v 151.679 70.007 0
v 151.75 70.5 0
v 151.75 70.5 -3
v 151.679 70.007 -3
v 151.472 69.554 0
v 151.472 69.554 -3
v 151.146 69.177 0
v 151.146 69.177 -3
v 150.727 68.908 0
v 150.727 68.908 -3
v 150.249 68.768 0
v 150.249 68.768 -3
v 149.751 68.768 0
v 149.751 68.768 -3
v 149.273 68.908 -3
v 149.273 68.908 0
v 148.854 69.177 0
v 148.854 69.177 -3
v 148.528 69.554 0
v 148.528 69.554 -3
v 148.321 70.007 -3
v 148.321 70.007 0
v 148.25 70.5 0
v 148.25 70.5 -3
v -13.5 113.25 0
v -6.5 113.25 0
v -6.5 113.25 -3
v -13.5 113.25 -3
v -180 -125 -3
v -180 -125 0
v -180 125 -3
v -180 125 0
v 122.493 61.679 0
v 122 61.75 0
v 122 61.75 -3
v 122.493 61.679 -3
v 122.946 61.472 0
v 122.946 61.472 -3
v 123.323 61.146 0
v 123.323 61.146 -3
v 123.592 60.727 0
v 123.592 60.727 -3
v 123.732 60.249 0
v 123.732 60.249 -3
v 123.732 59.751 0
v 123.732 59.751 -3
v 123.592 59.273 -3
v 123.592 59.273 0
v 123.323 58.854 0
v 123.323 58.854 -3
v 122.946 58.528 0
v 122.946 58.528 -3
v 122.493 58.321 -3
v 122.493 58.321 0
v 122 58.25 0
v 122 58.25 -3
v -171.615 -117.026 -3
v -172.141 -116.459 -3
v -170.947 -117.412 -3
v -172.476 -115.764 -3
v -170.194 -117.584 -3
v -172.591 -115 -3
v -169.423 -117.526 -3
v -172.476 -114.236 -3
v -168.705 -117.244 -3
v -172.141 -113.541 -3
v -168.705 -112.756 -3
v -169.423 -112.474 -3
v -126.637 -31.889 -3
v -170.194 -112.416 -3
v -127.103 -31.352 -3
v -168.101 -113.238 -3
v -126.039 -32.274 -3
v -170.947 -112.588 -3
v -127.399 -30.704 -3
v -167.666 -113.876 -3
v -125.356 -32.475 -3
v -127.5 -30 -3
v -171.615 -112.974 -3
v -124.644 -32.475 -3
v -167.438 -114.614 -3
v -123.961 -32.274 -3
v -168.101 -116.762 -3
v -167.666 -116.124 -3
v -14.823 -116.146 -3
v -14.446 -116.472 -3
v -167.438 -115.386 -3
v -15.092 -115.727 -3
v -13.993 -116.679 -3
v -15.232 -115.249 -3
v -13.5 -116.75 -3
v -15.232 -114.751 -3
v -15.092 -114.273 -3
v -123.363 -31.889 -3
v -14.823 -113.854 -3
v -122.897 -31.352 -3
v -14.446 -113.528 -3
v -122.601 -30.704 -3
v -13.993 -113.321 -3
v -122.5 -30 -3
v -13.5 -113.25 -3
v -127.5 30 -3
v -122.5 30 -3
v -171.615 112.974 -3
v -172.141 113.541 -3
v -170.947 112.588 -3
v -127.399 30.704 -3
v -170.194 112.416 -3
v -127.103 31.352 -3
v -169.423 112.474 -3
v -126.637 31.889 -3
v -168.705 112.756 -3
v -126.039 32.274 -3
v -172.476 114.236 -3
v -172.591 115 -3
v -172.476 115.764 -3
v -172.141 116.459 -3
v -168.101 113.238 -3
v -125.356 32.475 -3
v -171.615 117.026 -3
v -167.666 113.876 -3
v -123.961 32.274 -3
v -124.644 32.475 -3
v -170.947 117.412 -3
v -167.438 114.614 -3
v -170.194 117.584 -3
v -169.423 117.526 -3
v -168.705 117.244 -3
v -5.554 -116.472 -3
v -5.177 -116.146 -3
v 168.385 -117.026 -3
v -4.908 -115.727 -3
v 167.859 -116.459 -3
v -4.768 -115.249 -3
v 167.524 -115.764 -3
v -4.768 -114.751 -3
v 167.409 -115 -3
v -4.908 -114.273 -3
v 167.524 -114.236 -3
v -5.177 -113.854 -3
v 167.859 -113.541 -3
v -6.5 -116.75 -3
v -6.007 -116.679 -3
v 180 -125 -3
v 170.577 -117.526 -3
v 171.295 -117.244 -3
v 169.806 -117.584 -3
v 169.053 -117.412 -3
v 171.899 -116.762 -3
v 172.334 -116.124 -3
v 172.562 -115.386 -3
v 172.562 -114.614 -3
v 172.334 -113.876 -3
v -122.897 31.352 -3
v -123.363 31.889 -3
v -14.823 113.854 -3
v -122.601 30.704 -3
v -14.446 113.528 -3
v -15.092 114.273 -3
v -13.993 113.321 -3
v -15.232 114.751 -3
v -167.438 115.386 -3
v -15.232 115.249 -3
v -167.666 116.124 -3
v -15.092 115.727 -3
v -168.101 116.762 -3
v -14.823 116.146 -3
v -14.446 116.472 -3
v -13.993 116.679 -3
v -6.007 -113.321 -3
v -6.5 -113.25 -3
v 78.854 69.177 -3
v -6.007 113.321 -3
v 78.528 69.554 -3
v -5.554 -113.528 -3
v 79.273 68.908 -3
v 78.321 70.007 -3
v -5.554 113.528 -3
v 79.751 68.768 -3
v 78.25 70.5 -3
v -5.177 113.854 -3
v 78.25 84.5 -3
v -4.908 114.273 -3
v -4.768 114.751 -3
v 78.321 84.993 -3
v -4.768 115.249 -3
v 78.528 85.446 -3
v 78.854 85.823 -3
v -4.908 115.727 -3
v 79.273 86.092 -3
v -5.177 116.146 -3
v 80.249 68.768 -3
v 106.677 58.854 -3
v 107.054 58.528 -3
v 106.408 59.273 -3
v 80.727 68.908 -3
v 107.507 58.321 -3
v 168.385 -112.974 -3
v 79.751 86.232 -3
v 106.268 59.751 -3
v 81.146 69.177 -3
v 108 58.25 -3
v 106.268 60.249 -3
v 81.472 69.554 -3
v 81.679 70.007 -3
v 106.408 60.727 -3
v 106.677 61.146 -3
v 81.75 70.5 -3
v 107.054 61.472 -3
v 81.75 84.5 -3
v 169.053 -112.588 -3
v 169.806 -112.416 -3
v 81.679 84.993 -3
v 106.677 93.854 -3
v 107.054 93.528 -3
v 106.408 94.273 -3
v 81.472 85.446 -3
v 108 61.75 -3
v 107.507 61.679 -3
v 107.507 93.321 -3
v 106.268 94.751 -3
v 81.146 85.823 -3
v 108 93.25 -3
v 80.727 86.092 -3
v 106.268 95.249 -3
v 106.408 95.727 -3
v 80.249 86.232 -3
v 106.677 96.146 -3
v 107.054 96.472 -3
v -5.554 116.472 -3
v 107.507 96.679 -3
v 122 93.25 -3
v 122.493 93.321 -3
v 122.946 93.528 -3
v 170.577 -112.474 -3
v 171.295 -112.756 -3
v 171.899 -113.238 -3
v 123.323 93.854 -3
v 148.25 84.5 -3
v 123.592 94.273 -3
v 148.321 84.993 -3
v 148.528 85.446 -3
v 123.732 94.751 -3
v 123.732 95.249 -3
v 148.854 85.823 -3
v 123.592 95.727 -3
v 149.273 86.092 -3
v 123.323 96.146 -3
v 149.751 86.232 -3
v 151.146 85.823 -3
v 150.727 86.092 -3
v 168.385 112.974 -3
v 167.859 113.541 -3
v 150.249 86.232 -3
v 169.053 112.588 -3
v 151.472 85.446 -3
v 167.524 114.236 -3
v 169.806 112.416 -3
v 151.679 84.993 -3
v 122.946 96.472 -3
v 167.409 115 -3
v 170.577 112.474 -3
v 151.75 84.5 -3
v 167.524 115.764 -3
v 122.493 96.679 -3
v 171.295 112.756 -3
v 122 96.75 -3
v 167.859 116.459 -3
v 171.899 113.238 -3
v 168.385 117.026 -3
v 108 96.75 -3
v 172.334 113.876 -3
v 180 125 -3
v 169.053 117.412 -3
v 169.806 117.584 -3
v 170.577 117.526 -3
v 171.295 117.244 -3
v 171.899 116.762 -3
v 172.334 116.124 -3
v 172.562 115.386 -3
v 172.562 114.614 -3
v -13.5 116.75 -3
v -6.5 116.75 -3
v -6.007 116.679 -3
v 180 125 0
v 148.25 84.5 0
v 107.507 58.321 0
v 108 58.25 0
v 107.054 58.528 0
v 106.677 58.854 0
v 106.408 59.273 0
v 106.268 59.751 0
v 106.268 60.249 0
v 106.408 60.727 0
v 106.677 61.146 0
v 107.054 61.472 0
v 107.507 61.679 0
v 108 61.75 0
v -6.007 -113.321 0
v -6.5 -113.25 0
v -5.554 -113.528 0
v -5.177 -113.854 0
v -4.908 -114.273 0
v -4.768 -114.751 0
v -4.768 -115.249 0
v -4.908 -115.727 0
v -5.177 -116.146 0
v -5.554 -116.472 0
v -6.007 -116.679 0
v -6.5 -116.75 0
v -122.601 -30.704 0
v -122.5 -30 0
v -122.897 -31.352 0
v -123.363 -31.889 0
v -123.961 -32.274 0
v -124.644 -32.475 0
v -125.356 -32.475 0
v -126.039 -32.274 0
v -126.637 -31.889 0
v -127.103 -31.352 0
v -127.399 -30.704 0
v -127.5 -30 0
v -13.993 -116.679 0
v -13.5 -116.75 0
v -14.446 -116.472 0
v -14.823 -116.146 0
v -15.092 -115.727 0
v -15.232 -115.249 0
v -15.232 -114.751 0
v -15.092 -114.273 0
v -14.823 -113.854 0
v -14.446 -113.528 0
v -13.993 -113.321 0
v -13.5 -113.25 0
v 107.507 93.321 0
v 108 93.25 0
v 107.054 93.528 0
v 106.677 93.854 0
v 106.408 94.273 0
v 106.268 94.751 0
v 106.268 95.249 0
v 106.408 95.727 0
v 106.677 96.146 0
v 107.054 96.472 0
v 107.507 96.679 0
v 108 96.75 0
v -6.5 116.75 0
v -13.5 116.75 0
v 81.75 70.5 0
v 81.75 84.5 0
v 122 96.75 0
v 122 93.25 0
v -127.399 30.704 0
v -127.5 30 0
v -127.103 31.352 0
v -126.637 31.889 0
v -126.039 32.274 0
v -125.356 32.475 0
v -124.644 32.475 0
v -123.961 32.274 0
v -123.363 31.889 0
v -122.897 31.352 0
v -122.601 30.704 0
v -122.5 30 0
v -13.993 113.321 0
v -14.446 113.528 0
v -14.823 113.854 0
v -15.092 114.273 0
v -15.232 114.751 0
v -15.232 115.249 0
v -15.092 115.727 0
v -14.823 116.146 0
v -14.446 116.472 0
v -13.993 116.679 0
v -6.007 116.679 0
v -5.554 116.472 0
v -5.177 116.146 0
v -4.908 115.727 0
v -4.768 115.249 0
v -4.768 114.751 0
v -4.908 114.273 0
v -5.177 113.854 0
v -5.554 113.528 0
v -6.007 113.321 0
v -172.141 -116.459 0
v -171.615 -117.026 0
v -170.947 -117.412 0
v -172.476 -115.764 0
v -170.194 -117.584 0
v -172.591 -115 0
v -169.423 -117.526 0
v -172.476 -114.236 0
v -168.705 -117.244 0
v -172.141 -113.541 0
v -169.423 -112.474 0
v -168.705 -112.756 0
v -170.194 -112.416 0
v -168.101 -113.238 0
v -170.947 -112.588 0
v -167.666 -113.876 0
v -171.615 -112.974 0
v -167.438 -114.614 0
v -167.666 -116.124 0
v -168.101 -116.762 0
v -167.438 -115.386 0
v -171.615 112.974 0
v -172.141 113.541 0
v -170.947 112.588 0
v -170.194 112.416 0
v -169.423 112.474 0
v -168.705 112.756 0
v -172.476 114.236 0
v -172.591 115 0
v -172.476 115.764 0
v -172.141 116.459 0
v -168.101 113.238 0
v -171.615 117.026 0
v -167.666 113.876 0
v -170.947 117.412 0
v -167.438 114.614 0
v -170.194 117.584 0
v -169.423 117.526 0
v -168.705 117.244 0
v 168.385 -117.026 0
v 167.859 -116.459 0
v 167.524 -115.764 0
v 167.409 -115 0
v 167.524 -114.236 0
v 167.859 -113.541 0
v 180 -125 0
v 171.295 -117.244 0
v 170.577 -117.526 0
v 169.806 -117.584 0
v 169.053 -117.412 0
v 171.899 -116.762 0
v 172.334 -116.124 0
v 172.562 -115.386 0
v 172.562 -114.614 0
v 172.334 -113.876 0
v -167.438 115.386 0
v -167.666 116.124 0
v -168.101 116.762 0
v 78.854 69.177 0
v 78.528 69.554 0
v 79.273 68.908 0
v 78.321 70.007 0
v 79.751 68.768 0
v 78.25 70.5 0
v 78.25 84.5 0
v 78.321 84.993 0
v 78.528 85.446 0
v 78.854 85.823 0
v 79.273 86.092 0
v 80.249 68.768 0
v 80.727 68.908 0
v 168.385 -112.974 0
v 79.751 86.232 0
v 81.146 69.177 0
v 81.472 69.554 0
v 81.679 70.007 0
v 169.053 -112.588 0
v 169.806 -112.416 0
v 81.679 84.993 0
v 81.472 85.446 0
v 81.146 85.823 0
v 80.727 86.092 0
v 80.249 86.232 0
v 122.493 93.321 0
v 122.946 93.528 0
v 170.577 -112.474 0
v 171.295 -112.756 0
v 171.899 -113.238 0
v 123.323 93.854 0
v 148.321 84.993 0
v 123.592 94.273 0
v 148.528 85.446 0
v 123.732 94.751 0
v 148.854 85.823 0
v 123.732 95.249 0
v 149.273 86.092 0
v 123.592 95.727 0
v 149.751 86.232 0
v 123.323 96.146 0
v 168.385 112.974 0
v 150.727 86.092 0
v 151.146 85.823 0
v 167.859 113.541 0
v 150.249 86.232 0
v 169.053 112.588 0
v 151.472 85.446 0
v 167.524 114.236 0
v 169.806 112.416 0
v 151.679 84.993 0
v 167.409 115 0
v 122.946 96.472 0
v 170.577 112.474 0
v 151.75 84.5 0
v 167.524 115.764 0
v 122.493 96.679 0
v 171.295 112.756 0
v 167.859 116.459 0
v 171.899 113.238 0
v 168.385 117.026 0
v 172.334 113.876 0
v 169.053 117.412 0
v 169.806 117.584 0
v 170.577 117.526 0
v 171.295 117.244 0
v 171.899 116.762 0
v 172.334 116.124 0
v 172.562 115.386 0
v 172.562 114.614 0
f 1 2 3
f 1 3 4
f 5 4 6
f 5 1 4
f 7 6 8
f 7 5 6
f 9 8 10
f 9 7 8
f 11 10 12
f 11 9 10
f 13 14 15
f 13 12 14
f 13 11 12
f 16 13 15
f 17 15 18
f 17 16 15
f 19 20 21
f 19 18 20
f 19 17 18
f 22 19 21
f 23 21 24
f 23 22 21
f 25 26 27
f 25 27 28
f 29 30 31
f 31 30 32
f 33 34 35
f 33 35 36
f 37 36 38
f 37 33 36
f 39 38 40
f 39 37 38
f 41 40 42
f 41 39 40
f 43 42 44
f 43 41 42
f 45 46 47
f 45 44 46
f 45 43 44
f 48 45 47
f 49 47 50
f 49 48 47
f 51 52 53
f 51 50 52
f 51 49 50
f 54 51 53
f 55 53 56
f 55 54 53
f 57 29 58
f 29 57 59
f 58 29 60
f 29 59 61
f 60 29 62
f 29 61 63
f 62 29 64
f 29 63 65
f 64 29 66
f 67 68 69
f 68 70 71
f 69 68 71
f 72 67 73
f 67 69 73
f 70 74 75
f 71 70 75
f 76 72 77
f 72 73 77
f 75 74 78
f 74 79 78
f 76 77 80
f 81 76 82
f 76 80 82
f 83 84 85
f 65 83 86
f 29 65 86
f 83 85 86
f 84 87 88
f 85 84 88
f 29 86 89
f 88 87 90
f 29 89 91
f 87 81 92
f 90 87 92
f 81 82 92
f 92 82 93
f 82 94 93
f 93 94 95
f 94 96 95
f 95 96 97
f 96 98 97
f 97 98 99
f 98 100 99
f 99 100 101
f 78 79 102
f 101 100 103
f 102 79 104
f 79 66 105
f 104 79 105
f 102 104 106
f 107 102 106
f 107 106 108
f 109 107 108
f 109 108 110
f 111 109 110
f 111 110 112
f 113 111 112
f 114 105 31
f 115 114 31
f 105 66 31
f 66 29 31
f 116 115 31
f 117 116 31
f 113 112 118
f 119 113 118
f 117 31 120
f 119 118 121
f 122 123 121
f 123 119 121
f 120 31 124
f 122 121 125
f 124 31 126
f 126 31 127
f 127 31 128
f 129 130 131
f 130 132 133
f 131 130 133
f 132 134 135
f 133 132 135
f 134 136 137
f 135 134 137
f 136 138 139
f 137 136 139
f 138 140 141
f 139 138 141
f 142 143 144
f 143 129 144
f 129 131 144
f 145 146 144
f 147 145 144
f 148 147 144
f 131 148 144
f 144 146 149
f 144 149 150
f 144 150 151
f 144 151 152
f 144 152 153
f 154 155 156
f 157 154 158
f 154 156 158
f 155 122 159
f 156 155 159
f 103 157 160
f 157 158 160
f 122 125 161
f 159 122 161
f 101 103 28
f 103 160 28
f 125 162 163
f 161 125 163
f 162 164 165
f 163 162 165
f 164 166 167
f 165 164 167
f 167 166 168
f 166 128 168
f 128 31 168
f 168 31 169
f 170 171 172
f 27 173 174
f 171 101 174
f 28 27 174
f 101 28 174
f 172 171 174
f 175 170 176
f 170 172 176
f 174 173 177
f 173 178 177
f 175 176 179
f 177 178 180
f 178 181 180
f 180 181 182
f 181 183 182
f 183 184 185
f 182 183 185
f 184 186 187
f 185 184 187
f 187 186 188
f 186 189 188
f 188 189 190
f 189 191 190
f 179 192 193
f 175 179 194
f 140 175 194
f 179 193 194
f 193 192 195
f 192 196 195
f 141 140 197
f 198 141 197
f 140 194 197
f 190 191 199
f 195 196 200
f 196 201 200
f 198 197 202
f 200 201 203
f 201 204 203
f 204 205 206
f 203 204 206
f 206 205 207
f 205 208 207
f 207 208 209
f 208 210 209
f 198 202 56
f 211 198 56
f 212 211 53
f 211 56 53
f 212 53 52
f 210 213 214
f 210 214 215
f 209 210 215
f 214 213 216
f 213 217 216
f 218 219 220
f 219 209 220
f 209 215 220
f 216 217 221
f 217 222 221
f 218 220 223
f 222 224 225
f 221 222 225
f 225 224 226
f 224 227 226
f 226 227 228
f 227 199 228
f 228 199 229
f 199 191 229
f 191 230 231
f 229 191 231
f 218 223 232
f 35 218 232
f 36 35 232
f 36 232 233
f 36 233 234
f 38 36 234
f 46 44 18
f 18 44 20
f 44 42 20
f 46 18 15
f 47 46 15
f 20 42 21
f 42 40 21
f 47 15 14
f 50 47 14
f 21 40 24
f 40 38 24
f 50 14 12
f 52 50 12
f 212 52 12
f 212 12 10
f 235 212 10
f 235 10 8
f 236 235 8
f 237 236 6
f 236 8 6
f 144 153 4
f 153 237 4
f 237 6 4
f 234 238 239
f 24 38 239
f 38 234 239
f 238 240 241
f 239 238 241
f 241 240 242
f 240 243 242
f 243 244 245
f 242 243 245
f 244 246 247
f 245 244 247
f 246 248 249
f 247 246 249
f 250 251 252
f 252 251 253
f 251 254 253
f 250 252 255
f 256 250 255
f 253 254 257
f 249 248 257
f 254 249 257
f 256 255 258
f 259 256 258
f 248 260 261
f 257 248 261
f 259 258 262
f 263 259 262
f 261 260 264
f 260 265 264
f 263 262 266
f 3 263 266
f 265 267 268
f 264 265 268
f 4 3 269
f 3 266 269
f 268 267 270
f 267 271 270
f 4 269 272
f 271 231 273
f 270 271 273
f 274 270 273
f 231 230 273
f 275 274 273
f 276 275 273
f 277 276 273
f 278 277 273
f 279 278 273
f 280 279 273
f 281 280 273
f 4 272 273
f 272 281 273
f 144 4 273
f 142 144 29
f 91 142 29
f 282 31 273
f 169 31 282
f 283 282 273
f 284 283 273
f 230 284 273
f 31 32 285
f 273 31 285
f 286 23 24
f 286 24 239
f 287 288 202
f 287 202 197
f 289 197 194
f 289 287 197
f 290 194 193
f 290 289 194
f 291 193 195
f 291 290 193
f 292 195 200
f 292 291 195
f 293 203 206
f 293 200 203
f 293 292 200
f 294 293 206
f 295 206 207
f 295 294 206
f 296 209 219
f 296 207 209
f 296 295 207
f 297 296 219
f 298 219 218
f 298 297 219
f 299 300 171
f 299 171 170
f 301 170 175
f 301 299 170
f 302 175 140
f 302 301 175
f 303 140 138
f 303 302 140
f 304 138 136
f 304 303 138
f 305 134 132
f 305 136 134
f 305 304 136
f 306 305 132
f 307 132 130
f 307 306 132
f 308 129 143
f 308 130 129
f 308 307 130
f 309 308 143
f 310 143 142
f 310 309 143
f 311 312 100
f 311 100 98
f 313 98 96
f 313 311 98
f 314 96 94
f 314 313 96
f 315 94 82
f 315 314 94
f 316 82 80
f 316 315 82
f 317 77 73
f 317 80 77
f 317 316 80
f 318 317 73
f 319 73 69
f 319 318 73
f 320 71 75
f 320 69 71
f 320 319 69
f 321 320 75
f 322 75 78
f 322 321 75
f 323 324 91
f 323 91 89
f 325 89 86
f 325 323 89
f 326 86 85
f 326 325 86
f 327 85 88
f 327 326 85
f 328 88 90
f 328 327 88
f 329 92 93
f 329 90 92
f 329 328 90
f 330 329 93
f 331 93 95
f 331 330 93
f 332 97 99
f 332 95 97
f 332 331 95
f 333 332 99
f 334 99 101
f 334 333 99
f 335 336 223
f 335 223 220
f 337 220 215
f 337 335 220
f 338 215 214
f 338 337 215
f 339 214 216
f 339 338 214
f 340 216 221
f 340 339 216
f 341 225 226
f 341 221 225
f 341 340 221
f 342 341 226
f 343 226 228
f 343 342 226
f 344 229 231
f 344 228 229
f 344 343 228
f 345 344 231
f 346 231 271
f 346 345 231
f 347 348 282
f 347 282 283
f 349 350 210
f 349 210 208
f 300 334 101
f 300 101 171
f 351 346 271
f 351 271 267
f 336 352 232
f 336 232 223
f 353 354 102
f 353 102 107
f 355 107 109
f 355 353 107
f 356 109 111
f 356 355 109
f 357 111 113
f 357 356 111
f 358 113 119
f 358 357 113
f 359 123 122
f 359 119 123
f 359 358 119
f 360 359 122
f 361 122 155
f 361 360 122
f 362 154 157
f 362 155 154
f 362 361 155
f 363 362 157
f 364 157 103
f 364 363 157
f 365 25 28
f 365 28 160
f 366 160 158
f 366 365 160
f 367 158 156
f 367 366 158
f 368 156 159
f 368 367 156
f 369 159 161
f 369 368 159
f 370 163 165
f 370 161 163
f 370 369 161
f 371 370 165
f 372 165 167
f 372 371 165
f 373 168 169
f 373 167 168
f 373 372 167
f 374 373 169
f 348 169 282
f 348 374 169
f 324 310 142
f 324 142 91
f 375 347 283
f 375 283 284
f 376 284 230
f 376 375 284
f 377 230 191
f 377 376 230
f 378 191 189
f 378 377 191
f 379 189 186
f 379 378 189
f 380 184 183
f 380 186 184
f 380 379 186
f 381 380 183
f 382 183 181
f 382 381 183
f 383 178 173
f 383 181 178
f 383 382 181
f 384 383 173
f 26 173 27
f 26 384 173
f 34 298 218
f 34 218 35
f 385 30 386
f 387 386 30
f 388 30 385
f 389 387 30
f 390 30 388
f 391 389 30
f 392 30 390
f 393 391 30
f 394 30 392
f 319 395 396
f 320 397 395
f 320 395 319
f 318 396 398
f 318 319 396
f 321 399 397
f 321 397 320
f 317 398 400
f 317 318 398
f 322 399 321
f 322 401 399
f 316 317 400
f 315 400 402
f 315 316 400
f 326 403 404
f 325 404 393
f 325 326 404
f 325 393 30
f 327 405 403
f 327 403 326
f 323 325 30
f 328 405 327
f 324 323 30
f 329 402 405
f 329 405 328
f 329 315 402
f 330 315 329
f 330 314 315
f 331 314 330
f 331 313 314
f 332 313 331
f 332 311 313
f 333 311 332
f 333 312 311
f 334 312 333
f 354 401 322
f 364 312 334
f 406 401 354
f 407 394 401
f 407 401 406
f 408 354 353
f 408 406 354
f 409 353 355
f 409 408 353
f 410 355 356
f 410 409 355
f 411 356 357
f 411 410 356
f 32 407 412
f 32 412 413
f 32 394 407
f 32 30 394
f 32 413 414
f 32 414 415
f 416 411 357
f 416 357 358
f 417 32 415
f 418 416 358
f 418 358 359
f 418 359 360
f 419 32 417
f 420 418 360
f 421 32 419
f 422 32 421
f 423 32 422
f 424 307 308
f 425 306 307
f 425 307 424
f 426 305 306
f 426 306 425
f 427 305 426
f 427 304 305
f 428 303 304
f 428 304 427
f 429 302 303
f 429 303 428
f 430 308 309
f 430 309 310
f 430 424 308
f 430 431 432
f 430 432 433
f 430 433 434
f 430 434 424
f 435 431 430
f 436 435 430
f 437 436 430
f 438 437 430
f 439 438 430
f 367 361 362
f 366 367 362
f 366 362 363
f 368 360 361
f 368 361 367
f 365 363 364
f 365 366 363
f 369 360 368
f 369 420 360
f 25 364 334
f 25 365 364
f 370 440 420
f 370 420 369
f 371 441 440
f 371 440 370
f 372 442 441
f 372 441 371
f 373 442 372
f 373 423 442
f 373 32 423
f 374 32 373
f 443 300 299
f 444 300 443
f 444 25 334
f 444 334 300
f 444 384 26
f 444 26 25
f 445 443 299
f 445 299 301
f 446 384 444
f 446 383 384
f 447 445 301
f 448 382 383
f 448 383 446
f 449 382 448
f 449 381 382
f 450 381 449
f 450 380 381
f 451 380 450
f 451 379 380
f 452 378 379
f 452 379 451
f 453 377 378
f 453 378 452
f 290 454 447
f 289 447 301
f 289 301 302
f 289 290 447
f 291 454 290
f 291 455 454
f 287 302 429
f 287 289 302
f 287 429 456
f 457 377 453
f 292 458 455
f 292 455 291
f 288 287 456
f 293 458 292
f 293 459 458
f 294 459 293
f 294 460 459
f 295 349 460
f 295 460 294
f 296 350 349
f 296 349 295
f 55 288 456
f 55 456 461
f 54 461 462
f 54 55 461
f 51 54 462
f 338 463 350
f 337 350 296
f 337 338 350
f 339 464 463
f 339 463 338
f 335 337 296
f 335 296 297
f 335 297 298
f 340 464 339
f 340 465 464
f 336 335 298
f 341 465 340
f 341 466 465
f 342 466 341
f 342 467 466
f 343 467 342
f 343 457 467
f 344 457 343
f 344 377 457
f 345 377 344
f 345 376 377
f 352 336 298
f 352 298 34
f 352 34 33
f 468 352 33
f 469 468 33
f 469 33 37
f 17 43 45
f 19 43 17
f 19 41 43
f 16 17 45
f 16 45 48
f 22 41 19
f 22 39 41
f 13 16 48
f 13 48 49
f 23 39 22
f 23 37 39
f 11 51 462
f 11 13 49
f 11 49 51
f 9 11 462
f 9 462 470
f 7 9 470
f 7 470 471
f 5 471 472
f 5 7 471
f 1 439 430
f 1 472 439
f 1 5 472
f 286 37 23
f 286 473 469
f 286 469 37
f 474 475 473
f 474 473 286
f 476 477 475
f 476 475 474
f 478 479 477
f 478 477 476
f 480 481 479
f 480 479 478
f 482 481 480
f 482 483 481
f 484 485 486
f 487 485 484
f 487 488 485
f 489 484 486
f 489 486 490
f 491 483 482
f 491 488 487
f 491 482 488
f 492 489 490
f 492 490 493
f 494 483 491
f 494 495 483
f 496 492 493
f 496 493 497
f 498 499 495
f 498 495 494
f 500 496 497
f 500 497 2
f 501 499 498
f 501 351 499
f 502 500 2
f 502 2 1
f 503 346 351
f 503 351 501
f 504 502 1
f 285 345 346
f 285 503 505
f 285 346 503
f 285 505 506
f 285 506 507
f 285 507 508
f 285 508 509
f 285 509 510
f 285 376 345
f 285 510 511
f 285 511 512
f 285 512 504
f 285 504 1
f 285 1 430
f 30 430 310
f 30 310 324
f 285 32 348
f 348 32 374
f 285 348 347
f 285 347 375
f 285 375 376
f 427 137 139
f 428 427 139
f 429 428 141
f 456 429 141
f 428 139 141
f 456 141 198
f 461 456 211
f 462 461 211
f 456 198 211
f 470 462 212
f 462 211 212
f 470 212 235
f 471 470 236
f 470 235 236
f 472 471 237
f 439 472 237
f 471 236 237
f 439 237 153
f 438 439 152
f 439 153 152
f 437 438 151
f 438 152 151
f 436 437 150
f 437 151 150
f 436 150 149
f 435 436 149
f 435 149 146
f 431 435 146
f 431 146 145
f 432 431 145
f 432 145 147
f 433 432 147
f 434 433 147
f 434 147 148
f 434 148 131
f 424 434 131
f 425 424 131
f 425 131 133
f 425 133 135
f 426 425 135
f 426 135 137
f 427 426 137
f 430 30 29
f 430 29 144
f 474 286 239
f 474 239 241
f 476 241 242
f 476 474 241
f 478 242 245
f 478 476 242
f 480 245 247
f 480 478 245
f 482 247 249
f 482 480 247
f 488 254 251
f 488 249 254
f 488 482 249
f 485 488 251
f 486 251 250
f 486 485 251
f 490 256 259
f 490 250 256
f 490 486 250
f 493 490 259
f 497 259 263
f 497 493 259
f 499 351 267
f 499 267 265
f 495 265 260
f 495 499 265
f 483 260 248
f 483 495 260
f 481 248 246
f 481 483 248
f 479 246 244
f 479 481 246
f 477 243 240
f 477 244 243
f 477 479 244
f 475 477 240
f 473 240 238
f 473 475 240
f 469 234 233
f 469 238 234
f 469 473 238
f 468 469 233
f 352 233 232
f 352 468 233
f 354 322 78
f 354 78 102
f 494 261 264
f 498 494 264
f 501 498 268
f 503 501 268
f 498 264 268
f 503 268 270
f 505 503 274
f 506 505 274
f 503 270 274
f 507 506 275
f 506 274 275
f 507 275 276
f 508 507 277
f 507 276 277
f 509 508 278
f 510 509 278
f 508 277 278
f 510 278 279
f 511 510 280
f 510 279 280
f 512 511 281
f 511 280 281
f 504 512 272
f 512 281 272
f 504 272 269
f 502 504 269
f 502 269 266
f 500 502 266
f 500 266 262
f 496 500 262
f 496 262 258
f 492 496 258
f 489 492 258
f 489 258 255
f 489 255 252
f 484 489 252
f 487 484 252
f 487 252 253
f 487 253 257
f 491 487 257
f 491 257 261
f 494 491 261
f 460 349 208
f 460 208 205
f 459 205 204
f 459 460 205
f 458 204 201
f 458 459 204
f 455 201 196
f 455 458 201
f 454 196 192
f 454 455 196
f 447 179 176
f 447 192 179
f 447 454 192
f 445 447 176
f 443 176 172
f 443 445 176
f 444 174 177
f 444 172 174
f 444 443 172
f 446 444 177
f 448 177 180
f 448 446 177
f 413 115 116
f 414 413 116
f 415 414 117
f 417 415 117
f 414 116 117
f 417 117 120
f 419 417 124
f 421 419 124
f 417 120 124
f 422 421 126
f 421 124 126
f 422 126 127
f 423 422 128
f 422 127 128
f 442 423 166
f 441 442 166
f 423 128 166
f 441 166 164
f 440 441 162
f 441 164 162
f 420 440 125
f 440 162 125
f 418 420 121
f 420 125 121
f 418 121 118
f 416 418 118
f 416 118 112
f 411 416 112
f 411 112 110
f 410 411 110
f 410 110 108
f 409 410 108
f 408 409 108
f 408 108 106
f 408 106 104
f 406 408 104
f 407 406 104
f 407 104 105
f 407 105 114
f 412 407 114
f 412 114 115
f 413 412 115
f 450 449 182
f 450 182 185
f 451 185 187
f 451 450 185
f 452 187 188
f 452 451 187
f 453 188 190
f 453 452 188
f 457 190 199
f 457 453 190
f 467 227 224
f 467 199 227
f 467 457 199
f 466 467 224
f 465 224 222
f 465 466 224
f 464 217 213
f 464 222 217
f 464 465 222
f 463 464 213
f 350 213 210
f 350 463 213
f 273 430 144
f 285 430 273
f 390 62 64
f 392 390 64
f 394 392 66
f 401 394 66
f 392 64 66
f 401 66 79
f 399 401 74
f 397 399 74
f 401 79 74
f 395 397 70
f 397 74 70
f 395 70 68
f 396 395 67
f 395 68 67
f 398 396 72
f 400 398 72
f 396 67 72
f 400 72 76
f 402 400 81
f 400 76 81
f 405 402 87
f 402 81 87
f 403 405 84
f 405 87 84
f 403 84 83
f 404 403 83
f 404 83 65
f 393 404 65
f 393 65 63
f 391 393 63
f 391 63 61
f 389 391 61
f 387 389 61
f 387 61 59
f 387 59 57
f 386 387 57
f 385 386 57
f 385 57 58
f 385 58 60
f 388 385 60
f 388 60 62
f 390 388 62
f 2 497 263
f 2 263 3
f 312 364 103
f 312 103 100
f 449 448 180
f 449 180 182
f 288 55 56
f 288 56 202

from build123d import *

# Parameters (mm, degrees)
SKETCH1_W                  = 360
SKETCH1_H                  = 250
BASE_FLANGE1_DEPTH         = 3
F_6_0_204_DIAMETER_SLOT1_D = 5.1816
CUT_EXTRUDE1_DEPTH         = 10
CUT_EXTRUDE2_DEPTH         = 10
CUT_EXTRUDE4_DEPTH         = 10
CUT_EXTRUDE5_DEPTH         = 10
CUT_EXTRUDE6_DEPTH         = 10
CUT_EXTRUDE7_DEPTH         = 10
CUT_EXTRUDE8_DEPTH         = 10


# Sheet-metal steps are written as plain solids
with BuildPart() as part:
    # Sketch1 → Base-Flange1 (new body)
    with BuildSketch(Plane.XY):
        Rectangle(SKETCH1_W, SKETCH1_H)
    extrude(amount=-BASE_FLANGE1_DEPTH)

    # #6 (0.204) Diameter Slot1 (through all)
    with Locations(Plane.XY):
        with Locations((-170, -115), (-170, 115), (170, 115), (170, -115)):
            Hole(F_6_0_204_DIAMETER_SLOT1_D / 2)

    # Sketch8 → Cut-Extrude1 (cut)
    with BuildSketch(Plane.XY):
        with BuildLine():
            Line((-13.5, -113.25), (-6.5, -113.25))
            ThreePointArc((-6.5, -113.25), (-4.75, -115), (-6.5, -116.75))
            Line((-6.5, -116.75), (-13.5, -116.75))
            ThreePointArc((-13.5, -116.75), (-15.25, -115), (-13.5, -113.25))
        make_face()
    extrude(amount=-CUT_EXTRUDE1_DEPTH, mode=Mode.SUBTRACT)

    # Sketch9 → Cut-Extrude2 (cut)
    with BuildSketch(Plane.XY):
        with BuildLine():
            Line((-13.5, 116.75), (-6.5, 116.75))
            ThreePointArc((-6.5, 116.75), (-4.75, 115), (-6.5, 113.25))
            Line((-6.5, 113.25), (-13.5, 113.25))
            ThreePointArc((-13.5, 113.25), (-15.25, 115), (-13.5, 116.75))
        make_face()
    extrude(amount=-CUT_EXTRUDE2_DEPTH, mode=Mode.SUBTRACT)

    # Sketch10 → Cut-Extrude4 (cut)
    with BuildSketch(Plane.XY):
        with BuildLine():
            Line((151.75, 84.5), (151.75, 70.5))
            ThreePointArc((151.75, 70.5), (150, 68.75), (148.25, 70.5))
            Line((148.25, 70.5), (148.25, 84.5))
            ThreePointArc((148.25, 84.5), (150, 86.25), (151.75, 84.5))
        make_face()
    extrude(amount=-CUT_EXTRUDE4_DEPTH, mode=Mode.SUBTRACT)

    # Sketch11 → Cut-Extrude5 (cut)
    with BuildSketch(Plane.XY):
        with BuildLine():
            Line((108, 96.75), (122, 96.75))
            ThreePointArc((122, 96.75), (123.75, 95), (122, 93.25))
            Line((122, 93.25), (108, 93.25))
            ThreePointArc((108, 93.25), (106.25, 95), (108, 96.75))
        make_face()
    extrude(amount=-CUT_EXTRUDE5_DEPTH, mode=Mode.SUBTRACT)

    # Sketch12 → Cut-Extrude6 (cut)
    with BuildSketch(Plane.XY):
        with BuildLine():
            Line((108, 61.75), (122, 61.75))
            ThreePointArc((122, 61.75), (123.75, 60), (122, 58.25))
            Line((122, 58.25), (108, 58.25))
            ThreePointArc((108, 58.25), (106.25, 60), (108, 61.75))
        make_face()
    extrude(amount=-CUT_EXTRUDE6_DEPTH, mode=Mode.SUBTRACT)

    # Sketch13 → Cut-Extrude7 (cut)
    with BuildSketch(Plane.XY):
        with BuildLine():
            Line((81.75, 84.5), (81.75, 70.5))
            ThreePointArc((81.75, 70.5), (80, 68.75), (78.25, 70.5))
            Line((78.25, 70.5), (78.25, 84.5))
            ThreePointArc((78.25, 84.5), (80, 86.25), (81.75, 84.5))
        make_face()
    extrude(amount=-CUT_EXTRUDE7_DEPTH, mode=Mode.SUBTRACT)

    # Sketch14 → Cut-Extrude8 (cut)
    with BuildSketch(Plane.XY):
        with BuildLine():
            Line((-122.5, 30), (-122.5, -30))
            ThreePointArc((-122.5, -30), (-125, -32.5), (-127.5, -30))
            Line((-127.5, -30), (-127.5, 30))
            ThreePointArc((-127.5, 30), (-125, 32.5), (-122.5, 30))
        make_face()
    extrude(amount=-CUT_EXTRUDE8_DEPTH, mode=Mode.SUBTRACT)


solid = part.part
